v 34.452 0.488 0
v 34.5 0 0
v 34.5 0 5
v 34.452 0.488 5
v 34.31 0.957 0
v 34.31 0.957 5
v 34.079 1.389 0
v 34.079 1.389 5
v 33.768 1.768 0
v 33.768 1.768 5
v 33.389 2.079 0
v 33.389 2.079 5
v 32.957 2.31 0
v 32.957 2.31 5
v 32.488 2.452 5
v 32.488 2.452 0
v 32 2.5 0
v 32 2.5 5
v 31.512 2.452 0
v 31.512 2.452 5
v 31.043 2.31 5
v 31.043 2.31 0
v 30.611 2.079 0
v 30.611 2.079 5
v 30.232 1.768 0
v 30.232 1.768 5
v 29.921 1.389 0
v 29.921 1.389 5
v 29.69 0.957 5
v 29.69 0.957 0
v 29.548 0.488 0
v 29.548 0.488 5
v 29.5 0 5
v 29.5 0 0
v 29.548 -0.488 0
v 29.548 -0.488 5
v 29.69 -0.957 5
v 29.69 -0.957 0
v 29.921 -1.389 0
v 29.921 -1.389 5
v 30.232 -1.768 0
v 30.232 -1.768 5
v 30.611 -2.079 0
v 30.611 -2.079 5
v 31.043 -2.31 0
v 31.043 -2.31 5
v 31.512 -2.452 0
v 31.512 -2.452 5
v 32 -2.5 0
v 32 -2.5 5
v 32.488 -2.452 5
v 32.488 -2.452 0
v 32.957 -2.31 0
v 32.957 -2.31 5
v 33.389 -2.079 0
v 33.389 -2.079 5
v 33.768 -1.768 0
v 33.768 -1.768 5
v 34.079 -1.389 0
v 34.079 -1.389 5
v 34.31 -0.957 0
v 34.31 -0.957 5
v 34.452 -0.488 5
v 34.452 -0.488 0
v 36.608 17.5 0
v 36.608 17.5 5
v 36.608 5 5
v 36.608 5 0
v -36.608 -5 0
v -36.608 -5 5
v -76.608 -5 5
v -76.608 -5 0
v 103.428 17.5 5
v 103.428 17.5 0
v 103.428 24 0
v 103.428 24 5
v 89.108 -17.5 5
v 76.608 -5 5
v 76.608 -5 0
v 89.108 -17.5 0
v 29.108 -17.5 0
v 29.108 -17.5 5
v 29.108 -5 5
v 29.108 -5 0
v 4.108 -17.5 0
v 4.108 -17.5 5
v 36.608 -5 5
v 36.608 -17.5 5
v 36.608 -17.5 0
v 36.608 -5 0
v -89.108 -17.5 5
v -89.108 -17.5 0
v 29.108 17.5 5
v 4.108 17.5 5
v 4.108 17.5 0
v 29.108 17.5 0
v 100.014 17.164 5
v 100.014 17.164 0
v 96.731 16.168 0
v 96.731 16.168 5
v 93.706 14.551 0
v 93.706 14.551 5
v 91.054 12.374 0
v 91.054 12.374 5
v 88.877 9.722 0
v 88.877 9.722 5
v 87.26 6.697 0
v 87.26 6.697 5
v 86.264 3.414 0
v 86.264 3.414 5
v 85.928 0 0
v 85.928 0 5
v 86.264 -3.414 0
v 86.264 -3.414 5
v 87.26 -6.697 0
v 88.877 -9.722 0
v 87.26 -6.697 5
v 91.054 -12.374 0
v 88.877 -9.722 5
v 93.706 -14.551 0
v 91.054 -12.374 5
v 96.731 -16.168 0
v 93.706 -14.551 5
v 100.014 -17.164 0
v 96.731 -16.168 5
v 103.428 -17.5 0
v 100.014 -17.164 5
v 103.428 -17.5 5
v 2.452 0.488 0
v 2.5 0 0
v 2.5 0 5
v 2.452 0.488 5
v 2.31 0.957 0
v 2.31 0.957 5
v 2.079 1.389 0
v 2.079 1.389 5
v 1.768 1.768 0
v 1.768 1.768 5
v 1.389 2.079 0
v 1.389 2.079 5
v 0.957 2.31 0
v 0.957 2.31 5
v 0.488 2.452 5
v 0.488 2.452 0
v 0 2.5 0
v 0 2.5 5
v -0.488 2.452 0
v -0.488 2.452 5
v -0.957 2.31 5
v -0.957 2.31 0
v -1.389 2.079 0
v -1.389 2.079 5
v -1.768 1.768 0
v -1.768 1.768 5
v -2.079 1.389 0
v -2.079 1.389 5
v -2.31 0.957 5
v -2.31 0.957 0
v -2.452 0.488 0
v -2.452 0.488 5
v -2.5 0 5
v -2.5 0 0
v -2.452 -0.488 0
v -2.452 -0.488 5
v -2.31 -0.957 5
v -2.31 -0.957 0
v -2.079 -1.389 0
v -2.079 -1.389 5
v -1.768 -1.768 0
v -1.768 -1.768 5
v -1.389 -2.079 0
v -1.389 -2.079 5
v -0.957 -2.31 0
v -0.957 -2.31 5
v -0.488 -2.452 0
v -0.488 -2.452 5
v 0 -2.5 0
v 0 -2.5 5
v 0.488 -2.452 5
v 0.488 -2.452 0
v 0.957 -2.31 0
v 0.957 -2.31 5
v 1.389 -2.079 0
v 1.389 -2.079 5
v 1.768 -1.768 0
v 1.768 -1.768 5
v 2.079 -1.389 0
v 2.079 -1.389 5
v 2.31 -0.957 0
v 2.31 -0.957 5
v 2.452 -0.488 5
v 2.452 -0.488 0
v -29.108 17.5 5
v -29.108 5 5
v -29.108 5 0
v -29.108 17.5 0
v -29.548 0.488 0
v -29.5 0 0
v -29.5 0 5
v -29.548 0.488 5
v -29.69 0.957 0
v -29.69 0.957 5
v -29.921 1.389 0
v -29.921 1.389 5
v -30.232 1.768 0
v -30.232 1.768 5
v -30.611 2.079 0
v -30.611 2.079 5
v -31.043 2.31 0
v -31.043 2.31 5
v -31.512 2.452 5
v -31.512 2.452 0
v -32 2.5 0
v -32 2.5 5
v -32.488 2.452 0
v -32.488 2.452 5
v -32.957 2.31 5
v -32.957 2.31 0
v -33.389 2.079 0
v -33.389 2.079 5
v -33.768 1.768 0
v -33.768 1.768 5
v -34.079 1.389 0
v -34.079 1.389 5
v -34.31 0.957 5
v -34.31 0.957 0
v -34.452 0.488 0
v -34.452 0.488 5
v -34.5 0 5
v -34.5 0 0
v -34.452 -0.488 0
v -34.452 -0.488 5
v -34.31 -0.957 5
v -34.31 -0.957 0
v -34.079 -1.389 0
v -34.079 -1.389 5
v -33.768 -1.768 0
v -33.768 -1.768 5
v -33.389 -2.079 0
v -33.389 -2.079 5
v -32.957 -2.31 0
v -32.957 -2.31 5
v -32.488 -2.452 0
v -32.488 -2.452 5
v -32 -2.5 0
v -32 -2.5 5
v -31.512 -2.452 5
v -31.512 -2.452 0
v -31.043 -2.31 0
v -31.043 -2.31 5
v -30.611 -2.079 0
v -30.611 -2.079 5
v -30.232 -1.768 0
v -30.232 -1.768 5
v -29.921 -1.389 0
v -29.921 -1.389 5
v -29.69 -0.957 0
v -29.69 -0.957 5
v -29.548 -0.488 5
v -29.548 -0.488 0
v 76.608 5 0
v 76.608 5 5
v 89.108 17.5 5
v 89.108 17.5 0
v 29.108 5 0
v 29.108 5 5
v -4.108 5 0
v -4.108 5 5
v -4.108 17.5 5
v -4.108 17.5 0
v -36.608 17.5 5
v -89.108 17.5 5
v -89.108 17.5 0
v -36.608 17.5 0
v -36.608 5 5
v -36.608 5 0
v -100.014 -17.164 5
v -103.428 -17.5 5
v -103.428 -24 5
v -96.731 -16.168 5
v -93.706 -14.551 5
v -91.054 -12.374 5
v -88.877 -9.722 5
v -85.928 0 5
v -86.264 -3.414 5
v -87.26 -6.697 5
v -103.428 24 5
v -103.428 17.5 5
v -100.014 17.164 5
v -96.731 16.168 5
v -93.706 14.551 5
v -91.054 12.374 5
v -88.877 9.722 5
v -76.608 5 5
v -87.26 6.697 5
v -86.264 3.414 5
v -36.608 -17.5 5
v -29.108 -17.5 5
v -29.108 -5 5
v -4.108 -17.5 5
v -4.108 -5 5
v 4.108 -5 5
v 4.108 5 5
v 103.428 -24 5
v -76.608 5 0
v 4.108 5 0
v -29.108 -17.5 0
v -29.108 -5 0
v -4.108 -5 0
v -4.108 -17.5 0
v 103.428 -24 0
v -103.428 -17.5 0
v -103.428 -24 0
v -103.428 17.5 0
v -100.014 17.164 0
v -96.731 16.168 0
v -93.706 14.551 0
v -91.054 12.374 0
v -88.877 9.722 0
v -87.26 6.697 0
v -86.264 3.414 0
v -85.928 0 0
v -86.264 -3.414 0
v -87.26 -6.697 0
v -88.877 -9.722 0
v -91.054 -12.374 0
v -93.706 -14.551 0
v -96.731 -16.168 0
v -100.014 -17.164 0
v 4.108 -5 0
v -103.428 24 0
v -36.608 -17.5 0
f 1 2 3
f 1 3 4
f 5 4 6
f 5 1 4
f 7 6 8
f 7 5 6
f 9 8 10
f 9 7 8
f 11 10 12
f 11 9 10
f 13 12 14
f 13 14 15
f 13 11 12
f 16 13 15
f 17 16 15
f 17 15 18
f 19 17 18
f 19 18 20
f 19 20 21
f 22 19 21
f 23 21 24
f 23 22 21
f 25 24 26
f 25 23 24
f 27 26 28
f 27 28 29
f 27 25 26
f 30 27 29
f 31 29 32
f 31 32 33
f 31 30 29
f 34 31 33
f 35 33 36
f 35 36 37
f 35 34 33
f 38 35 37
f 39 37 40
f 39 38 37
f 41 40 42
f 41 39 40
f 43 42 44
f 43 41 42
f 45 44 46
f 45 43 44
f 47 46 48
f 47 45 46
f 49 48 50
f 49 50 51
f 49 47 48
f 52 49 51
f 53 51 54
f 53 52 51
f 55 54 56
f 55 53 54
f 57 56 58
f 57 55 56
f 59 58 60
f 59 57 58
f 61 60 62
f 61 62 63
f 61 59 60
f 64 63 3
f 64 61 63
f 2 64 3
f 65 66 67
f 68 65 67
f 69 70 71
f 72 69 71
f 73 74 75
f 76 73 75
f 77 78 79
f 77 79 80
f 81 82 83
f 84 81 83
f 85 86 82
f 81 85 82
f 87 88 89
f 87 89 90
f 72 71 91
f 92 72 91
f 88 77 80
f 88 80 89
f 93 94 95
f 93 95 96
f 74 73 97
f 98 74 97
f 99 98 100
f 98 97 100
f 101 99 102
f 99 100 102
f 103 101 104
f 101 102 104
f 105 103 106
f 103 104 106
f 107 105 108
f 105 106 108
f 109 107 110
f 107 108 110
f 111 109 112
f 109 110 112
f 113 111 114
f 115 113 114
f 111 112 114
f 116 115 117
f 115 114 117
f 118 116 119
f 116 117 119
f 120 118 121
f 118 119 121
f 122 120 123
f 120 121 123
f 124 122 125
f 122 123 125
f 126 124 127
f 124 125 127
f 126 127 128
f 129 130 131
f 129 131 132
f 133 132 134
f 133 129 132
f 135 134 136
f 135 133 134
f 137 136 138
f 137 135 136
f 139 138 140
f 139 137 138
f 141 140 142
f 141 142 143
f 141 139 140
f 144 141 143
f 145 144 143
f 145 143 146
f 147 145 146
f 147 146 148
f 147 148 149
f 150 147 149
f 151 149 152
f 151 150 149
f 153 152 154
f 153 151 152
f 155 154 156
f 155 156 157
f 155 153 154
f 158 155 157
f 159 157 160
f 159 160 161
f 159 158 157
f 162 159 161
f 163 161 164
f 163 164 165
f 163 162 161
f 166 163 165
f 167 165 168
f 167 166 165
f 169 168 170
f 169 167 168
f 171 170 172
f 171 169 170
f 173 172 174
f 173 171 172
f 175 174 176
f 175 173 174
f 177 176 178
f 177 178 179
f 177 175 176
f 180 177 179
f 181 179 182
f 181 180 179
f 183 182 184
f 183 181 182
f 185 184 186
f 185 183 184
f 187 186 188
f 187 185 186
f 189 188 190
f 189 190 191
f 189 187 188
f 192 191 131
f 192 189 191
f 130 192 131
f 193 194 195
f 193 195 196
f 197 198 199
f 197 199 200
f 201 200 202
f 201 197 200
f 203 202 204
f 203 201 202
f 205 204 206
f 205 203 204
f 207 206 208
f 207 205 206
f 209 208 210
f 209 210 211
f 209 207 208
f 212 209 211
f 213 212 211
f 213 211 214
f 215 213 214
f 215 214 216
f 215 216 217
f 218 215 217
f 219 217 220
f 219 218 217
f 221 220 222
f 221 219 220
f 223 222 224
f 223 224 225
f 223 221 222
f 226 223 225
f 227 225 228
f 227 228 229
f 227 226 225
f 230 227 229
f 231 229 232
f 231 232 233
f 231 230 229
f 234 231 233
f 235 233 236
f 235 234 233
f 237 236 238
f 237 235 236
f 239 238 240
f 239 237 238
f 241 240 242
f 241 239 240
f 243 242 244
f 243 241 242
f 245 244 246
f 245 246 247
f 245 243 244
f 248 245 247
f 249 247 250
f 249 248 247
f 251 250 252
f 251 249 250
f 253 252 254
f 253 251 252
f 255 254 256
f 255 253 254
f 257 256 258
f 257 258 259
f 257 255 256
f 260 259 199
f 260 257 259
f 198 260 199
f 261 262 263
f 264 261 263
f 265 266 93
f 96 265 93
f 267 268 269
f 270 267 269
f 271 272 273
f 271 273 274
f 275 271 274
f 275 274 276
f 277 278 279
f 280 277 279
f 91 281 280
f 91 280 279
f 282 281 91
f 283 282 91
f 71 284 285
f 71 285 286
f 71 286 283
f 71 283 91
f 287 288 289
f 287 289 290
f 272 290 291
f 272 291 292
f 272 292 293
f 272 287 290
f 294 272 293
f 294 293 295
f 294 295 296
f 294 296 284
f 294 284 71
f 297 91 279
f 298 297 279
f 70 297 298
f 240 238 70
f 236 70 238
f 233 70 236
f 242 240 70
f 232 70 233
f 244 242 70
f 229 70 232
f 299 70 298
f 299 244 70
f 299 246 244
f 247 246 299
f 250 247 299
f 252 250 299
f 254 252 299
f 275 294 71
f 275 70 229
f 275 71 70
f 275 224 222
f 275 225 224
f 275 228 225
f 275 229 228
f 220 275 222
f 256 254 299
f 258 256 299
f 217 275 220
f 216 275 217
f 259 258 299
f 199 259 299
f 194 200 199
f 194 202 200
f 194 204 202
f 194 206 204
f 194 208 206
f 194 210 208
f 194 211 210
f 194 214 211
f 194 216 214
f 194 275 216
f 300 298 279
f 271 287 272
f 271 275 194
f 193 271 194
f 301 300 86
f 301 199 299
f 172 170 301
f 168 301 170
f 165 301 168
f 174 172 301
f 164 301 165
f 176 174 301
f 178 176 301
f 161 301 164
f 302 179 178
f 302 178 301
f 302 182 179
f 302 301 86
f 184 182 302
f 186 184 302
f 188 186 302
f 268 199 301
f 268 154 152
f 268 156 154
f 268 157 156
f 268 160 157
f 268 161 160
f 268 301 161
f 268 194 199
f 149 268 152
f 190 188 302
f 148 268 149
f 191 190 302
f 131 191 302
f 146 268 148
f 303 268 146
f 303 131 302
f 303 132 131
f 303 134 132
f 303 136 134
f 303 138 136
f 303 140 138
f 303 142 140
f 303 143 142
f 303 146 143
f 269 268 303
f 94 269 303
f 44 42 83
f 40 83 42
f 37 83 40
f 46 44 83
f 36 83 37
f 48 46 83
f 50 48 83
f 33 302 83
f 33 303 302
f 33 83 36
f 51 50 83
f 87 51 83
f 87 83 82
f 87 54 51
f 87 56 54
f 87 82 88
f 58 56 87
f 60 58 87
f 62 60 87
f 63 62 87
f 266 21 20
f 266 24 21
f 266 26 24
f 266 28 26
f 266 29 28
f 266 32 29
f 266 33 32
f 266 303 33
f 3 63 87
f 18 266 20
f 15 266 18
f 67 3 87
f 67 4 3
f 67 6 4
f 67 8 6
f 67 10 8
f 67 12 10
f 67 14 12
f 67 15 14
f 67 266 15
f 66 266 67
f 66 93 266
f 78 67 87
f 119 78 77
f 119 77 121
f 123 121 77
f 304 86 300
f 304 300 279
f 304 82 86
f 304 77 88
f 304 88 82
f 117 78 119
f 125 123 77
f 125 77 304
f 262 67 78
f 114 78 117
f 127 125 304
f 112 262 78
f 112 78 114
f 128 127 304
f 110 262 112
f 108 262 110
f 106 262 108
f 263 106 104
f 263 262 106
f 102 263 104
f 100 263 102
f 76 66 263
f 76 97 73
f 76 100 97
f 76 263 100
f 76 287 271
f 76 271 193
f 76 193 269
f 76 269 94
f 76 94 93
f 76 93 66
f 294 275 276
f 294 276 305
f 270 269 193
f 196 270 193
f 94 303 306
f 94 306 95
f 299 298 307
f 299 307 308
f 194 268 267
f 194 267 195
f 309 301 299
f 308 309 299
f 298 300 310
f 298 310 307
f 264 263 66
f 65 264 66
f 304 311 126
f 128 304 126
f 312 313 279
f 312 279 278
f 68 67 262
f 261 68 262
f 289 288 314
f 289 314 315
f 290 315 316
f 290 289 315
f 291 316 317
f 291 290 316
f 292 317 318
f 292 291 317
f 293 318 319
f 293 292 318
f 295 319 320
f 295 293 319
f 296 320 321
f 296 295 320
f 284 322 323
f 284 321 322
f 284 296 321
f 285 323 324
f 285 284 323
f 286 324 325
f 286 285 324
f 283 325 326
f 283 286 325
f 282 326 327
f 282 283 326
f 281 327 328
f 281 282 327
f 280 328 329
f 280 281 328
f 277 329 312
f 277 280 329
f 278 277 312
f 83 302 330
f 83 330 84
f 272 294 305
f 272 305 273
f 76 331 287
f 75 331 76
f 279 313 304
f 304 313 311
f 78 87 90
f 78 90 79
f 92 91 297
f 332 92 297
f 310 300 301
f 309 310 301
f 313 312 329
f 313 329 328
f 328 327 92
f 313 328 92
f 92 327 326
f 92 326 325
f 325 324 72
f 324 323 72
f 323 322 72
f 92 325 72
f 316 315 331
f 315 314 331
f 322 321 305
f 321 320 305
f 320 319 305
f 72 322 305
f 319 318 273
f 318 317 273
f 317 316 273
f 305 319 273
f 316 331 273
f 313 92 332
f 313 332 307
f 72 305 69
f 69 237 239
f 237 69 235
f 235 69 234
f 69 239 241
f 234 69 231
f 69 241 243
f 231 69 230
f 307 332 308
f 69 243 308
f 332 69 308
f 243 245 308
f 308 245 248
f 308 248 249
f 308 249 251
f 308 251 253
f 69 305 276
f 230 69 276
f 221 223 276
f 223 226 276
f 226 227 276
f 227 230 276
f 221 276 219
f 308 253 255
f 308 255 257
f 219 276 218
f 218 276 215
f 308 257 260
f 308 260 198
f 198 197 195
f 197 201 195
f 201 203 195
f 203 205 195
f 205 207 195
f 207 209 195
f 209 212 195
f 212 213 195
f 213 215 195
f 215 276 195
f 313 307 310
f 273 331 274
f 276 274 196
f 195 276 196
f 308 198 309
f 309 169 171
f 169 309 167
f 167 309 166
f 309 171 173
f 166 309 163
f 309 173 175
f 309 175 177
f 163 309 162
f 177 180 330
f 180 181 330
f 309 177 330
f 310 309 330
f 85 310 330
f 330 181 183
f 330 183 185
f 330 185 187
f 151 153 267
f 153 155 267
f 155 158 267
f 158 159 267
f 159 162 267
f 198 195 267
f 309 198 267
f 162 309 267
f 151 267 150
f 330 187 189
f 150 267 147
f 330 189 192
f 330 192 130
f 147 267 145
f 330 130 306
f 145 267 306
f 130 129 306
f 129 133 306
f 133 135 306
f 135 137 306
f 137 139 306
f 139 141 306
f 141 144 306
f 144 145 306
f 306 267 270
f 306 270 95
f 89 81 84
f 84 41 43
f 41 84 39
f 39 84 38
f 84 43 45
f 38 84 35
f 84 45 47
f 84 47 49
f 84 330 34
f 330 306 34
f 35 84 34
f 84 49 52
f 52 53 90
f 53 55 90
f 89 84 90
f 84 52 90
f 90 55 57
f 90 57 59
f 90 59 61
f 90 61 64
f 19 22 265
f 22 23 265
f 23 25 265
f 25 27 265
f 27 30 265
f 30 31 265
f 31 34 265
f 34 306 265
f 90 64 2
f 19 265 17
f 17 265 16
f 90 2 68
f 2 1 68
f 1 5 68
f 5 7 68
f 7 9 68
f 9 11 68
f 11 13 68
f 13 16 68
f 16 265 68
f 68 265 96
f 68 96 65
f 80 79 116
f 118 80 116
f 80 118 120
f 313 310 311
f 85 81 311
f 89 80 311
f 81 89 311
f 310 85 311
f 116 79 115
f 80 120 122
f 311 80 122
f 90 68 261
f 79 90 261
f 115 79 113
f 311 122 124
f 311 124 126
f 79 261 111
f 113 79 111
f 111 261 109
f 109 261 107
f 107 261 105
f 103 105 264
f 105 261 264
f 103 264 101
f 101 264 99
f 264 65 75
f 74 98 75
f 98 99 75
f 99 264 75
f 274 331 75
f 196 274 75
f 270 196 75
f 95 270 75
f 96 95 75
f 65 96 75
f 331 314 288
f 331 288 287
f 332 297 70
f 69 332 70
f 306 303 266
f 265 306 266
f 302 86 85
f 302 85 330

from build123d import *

# Parameters (mm, degrees)
SKETCH1_W           = 206.856
SKETCH1_H           = 48
SKETCH1_R           = 2.5
BOSS_EXTRUDE1_DEPTH = 5
SKETCH2_R           = 17.5
SKETCH2_W           = 25
SKETCH2_H           = 12.5
CUT_EXTRUDE1_DEPTH  = 107.293702466


with BuildPart() as part:
    # Sketch1 → Boss-Extrude1 (new body)
    with BuildSketch(Plane.XY):
        Rectangle(SKETCH1_W, SKETCH1_H)
        Circle(SKETCH1_R, mode=Mode.SUBTRACT)
        with Locations((32, 0)):
            Circle(SKETCH1_R, mode=Mode.SUBTRACT)
        with Locations((-32, 0)):
            Circle(SKETCH1_R, mode=Mode.SUBTRACT)
    extrude(amount=BOSS_EXTRUDE1_DEPTH)

    # Sketch2 → Cut-Extrude1 (cut, through all)
    with BuildSketch(Plane.XY.offset(5)):
        with Locations((103.428, 0)):
            Circle(SKETCH2_R)
        Polygon((89.108194847, 17.5), (36.608194847, 17.5), (36.608194847, 5), (76.608194847, 5), align=None)
        with Locations((16.608194847, 11.25)):
            Rectangle(SKETCH2_W, SKETCH2_H)
        Polygon((89.108194847, -17.5), (36.608194847, -17.5), (36.608194847, -5), (76.608194847, -5), align=None)
        with Locations((16.608194847, -11.25)):
            Rectangle(SKETCH2_W, SKETCH2_H)
    cut_extrude1 = extrude(amount=-CUT_EXTRUDE1_DEPTH, mode=Mode.SUBTRACT)

    # Mirror1: Cut-Extrude1 across plane
    add(cut_extrude1.mirror(Plane(origin=(0, 0, 0), x_dir=(0, 0, 1), z_dir=(1, 0, 0))), mode=Mode.SUBTRACT)


solid = part.part
